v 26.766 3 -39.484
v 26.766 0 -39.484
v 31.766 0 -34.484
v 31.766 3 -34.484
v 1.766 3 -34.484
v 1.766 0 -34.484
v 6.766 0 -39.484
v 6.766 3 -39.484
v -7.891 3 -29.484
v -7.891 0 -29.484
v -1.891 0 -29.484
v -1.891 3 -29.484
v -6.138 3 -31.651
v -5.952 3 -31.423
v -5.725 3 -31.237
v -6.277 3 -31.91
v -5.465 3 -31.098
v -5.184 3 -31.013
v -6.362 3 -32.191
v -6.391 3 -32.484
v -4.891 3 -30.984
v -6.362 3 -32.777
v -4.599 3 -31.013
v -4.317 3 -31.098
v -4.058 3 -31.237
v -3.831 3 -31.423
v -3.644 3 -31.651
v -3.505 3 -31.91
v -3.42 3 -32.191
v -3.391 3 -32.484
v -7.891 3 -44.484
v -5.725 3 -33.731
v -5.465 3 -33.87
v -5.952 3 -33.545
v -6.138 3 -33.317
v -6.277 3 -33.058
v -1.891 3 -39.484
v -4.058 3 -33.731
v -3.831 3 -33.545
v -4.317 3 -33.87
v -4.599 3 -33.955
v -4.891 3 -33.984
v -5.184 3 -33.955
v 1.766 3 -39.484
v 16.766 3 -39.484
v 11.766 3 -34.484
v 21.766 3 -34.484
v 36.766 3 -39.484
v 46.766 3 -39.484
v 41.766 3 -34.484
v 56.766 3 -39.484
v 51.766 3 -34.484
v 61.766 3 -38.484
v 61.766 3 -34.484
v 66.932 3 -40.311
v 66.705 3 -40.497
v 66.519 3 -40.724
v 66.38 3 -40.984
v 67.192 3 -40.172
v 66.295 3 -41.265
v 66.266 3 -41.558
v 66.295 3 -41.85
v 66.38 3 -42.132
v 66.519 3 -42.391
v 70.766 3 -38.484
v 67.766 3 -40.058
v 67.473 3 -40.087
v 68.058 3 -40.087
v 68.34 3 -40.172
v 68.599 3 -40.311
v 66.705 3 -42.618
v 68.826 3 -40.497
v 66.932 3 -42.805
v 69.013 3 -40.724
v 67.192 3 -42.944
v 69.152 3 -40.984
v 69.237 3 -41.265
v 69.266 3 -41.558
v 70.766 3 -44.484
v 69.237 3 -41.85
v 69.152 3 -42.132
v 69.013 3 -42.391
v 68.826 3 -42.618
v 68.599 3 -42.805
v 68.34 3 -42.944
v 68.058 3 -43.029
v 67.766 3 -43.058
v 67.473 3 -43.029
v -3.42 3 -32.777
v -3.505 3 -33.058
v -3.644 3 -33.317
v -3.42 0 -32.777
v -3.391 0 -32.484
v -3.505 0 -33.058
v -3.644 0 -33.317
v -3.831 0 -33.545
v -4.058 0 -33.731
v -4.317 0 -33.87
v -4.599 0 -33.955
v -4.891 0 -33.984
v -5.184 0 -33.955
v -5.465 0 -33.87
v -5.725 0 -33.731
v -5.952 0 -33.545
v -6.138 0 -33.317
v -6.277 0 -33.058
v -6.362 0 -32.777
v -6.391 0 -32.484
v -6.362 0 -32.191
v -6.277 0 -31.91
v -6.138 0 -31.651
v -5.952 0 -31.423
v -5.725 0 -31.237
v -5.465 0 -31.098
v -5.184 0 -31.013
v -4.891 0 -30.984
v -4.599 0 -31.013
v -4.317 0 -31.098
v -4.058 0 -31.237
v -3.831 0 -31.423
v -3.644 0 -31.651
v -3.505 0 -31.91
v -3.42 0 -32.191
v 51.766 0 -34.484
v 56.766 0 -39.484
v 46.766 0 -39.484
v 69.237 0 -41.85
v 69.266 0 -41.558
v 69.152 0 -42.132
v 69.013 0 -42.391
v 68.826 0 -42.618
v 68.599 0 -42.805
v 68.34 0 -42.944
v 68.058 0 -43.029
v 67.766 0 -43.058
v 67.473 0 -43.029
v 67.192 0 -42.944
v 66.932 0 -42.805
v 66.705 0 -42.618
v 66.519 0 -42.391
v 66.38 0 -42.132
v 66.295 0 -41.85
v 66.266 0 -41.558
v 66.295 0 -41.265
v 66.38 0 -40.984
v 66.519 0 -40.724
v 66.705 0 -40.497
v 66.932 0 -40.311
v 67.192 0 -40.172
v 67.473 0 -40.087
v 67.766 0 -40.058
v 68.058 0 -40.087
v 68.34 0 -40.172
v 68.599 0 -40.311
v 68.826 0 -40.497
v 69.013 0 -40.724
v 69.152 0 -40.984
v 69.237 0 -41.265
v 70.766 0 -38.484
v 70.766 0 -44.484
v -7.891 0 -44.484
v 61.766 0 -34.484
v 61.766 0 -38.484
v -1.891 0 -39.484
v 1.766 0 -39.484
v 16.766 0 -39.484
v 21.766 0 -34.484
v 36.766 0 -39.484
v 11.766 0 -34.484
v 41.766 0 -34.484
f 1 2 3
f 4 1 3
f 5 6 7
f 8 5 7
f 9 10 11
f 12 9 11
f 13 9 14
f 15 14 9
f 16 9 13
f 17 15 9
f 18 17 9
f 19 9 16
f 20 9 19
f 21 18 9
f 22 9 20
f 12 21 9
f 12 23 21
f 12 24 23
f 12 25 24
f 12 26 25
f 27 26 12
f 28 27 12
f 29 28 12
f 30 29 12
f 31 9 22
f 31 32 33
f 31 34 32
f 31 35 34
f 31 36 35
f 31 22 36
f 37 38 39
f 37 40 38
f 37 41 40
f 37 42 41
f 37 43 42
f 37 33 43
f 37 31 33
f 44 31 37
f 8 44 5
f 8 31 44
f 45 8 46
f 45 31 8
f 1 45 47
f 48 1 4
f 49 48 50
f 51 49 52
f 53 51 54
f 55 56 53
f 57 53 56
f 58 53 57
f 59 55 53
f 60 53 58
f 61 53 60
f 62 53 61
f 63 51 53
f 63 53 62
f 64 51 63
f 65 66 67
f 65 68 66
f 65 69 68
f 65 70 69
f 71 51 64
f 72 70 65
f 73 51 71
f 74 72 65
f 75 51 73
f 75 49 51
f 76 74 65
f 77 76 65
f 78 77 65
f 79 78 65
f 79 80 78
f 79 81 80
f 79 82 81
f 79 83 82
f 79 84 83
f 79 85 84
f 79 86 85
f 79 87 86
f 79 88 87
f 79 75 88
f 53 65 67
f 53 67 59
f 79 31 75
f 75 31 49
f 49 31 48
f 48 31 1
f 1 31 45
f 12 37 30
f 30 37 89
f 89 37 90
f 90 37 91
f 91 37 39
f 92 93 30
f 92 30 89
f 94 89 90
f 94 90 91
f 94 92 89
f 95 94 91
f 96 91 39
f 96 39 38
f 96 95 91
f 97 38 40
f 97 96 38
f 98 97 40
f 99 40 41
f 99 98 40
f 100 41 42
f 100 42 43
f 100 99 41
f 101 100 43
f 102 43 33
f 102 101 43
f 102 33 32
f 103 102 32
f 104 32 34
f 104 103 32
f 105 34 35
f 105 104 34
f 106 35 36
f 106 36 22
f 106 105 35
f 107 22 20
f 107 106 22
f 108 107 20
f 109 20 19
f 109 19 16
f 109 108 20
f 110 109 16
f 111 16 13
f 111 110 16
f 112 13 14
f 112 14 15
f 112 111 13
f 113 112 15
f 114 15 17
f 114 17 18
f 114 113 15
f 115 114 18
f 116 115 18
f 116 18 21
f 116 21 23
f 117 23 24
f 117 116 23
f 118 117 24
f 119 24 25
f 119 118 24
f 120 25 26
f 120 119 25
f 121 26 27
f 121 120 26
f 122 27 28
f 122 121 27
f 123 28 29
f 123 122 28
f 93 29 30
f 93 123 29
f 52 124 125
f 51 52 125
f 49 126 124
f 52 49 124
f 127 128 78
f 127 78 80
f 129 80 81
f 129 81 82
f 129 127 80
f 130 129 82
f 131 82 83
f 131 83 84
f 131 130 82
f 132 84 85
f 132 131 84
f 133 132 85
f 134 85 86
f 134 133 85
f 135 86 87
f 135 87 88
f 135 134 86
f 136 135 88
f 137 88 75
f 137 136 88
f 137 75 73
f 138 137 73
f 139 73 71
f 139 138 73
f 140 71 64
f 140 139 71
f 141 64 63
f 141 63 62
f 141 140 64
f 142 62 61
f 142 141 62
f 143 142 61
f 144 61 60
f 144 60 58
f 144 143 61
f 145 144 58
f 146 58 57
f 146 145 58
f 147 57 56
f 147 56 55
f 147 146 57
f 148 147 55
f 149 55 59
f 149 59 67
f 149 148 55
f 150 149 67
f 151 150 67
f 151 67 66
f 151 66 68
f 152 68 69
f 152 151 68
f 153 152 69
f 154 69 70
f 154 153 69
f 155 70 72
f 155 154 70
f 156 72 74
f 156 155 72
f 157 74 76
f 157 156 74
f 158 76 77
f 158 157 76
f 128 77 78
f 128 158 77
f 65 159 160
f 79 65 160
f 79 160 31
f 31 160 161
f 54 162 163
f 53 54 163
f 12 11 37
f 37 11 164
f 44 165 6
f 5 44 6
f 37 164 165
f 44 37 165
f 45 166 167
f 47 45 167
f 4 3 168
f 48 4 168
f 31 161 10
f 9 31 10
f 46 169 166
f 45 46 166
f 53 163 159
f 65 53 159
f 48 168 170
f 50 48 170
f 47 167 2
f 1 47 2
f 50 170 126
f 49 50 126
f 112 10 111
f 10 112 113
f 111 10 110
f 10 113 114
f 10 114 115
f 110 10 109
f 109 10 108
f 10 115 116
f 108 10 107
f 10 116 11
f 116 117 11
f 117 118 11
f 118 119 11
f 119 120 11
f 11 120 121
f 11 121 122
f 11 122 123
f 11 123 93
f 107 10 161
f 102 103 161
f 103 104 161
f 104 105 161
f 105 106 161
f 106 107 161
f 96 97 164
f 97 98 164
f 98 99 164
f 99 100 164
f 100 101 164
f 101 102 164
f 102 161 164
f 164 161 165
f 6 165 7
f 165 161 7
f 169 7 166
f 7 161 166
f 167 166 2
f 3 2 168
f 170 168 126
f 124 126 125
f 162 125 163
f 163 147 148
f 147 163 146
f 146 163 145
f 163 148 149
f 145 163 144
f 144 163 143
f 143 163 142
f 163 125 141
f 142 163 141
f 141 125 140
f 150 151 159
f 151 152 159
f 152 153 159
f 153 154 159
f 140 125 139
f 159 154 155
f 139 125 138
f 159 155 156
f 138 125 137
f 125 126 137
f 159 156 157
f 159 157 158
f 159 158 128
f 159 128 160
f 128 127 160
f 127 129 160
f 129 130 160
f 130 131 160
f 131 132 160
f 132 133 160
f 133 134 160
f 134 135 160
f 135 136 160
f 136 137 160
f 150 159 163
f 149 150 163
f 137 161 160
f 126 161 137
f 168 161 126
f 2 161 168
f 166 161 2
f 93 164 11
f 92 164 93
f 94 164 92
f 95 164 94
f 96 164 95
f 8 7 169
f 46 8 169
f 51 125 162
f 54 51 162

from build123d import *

# Parameters (mm, degrees)
SKETCH1_R           = 1.5
BOSS_EXTRUDE1_DEPTH = 3


with BuildPart() as part:
    # Sketch1 → Boss-Extrude1 (new body)
    with BuildSketch(Plane(origin=(0, 0, 0), x_dir=(1, 0, 0), z_dir=(0, 1, 0))):
        Polygon((1.765756862, 34.483992996), (6.765756862, 39.483992996), (11.765756862, 34.483992996), (16.765756862, 39.483992996), (21.765756862, 34.483992996), (26.765756862, 39.483992996), (31.765756862, 34.483992996), (36.765756862, 39.483992996), (41.765756862, 34.483992996), (46.765756862, 39.483992996), (51.765756862, 34.483992996), (56.765756862, 39.483992996), (61.765756862, 34.483992996), (61.765756862, 38.483992996), (70.765756862, 38.483992996), (70.765756862, 44.483992996), (1, 44.483992996), (-5.848815236, 44.483992996), (-7.891171506, 44.483992996), (-7.891171506, 29.483992996), (-1.891171506, 29.483992996), (-1.891171506, 39.483992996), (1.765756862, 39.483992996), align=None)
        with Locations((-4.891171506, 32.483992996)):
            Circle(SKETCH1_R, mode=Mode.SUBTRACT)
        with Locations((67.765756862, 41.557757711)):
            Circle(SKETCH1_R, mode=Mode.SUBTRACT)
    extrude(amount=BOSS_EXTRUDE1_DEPTH)


solid = part.part
